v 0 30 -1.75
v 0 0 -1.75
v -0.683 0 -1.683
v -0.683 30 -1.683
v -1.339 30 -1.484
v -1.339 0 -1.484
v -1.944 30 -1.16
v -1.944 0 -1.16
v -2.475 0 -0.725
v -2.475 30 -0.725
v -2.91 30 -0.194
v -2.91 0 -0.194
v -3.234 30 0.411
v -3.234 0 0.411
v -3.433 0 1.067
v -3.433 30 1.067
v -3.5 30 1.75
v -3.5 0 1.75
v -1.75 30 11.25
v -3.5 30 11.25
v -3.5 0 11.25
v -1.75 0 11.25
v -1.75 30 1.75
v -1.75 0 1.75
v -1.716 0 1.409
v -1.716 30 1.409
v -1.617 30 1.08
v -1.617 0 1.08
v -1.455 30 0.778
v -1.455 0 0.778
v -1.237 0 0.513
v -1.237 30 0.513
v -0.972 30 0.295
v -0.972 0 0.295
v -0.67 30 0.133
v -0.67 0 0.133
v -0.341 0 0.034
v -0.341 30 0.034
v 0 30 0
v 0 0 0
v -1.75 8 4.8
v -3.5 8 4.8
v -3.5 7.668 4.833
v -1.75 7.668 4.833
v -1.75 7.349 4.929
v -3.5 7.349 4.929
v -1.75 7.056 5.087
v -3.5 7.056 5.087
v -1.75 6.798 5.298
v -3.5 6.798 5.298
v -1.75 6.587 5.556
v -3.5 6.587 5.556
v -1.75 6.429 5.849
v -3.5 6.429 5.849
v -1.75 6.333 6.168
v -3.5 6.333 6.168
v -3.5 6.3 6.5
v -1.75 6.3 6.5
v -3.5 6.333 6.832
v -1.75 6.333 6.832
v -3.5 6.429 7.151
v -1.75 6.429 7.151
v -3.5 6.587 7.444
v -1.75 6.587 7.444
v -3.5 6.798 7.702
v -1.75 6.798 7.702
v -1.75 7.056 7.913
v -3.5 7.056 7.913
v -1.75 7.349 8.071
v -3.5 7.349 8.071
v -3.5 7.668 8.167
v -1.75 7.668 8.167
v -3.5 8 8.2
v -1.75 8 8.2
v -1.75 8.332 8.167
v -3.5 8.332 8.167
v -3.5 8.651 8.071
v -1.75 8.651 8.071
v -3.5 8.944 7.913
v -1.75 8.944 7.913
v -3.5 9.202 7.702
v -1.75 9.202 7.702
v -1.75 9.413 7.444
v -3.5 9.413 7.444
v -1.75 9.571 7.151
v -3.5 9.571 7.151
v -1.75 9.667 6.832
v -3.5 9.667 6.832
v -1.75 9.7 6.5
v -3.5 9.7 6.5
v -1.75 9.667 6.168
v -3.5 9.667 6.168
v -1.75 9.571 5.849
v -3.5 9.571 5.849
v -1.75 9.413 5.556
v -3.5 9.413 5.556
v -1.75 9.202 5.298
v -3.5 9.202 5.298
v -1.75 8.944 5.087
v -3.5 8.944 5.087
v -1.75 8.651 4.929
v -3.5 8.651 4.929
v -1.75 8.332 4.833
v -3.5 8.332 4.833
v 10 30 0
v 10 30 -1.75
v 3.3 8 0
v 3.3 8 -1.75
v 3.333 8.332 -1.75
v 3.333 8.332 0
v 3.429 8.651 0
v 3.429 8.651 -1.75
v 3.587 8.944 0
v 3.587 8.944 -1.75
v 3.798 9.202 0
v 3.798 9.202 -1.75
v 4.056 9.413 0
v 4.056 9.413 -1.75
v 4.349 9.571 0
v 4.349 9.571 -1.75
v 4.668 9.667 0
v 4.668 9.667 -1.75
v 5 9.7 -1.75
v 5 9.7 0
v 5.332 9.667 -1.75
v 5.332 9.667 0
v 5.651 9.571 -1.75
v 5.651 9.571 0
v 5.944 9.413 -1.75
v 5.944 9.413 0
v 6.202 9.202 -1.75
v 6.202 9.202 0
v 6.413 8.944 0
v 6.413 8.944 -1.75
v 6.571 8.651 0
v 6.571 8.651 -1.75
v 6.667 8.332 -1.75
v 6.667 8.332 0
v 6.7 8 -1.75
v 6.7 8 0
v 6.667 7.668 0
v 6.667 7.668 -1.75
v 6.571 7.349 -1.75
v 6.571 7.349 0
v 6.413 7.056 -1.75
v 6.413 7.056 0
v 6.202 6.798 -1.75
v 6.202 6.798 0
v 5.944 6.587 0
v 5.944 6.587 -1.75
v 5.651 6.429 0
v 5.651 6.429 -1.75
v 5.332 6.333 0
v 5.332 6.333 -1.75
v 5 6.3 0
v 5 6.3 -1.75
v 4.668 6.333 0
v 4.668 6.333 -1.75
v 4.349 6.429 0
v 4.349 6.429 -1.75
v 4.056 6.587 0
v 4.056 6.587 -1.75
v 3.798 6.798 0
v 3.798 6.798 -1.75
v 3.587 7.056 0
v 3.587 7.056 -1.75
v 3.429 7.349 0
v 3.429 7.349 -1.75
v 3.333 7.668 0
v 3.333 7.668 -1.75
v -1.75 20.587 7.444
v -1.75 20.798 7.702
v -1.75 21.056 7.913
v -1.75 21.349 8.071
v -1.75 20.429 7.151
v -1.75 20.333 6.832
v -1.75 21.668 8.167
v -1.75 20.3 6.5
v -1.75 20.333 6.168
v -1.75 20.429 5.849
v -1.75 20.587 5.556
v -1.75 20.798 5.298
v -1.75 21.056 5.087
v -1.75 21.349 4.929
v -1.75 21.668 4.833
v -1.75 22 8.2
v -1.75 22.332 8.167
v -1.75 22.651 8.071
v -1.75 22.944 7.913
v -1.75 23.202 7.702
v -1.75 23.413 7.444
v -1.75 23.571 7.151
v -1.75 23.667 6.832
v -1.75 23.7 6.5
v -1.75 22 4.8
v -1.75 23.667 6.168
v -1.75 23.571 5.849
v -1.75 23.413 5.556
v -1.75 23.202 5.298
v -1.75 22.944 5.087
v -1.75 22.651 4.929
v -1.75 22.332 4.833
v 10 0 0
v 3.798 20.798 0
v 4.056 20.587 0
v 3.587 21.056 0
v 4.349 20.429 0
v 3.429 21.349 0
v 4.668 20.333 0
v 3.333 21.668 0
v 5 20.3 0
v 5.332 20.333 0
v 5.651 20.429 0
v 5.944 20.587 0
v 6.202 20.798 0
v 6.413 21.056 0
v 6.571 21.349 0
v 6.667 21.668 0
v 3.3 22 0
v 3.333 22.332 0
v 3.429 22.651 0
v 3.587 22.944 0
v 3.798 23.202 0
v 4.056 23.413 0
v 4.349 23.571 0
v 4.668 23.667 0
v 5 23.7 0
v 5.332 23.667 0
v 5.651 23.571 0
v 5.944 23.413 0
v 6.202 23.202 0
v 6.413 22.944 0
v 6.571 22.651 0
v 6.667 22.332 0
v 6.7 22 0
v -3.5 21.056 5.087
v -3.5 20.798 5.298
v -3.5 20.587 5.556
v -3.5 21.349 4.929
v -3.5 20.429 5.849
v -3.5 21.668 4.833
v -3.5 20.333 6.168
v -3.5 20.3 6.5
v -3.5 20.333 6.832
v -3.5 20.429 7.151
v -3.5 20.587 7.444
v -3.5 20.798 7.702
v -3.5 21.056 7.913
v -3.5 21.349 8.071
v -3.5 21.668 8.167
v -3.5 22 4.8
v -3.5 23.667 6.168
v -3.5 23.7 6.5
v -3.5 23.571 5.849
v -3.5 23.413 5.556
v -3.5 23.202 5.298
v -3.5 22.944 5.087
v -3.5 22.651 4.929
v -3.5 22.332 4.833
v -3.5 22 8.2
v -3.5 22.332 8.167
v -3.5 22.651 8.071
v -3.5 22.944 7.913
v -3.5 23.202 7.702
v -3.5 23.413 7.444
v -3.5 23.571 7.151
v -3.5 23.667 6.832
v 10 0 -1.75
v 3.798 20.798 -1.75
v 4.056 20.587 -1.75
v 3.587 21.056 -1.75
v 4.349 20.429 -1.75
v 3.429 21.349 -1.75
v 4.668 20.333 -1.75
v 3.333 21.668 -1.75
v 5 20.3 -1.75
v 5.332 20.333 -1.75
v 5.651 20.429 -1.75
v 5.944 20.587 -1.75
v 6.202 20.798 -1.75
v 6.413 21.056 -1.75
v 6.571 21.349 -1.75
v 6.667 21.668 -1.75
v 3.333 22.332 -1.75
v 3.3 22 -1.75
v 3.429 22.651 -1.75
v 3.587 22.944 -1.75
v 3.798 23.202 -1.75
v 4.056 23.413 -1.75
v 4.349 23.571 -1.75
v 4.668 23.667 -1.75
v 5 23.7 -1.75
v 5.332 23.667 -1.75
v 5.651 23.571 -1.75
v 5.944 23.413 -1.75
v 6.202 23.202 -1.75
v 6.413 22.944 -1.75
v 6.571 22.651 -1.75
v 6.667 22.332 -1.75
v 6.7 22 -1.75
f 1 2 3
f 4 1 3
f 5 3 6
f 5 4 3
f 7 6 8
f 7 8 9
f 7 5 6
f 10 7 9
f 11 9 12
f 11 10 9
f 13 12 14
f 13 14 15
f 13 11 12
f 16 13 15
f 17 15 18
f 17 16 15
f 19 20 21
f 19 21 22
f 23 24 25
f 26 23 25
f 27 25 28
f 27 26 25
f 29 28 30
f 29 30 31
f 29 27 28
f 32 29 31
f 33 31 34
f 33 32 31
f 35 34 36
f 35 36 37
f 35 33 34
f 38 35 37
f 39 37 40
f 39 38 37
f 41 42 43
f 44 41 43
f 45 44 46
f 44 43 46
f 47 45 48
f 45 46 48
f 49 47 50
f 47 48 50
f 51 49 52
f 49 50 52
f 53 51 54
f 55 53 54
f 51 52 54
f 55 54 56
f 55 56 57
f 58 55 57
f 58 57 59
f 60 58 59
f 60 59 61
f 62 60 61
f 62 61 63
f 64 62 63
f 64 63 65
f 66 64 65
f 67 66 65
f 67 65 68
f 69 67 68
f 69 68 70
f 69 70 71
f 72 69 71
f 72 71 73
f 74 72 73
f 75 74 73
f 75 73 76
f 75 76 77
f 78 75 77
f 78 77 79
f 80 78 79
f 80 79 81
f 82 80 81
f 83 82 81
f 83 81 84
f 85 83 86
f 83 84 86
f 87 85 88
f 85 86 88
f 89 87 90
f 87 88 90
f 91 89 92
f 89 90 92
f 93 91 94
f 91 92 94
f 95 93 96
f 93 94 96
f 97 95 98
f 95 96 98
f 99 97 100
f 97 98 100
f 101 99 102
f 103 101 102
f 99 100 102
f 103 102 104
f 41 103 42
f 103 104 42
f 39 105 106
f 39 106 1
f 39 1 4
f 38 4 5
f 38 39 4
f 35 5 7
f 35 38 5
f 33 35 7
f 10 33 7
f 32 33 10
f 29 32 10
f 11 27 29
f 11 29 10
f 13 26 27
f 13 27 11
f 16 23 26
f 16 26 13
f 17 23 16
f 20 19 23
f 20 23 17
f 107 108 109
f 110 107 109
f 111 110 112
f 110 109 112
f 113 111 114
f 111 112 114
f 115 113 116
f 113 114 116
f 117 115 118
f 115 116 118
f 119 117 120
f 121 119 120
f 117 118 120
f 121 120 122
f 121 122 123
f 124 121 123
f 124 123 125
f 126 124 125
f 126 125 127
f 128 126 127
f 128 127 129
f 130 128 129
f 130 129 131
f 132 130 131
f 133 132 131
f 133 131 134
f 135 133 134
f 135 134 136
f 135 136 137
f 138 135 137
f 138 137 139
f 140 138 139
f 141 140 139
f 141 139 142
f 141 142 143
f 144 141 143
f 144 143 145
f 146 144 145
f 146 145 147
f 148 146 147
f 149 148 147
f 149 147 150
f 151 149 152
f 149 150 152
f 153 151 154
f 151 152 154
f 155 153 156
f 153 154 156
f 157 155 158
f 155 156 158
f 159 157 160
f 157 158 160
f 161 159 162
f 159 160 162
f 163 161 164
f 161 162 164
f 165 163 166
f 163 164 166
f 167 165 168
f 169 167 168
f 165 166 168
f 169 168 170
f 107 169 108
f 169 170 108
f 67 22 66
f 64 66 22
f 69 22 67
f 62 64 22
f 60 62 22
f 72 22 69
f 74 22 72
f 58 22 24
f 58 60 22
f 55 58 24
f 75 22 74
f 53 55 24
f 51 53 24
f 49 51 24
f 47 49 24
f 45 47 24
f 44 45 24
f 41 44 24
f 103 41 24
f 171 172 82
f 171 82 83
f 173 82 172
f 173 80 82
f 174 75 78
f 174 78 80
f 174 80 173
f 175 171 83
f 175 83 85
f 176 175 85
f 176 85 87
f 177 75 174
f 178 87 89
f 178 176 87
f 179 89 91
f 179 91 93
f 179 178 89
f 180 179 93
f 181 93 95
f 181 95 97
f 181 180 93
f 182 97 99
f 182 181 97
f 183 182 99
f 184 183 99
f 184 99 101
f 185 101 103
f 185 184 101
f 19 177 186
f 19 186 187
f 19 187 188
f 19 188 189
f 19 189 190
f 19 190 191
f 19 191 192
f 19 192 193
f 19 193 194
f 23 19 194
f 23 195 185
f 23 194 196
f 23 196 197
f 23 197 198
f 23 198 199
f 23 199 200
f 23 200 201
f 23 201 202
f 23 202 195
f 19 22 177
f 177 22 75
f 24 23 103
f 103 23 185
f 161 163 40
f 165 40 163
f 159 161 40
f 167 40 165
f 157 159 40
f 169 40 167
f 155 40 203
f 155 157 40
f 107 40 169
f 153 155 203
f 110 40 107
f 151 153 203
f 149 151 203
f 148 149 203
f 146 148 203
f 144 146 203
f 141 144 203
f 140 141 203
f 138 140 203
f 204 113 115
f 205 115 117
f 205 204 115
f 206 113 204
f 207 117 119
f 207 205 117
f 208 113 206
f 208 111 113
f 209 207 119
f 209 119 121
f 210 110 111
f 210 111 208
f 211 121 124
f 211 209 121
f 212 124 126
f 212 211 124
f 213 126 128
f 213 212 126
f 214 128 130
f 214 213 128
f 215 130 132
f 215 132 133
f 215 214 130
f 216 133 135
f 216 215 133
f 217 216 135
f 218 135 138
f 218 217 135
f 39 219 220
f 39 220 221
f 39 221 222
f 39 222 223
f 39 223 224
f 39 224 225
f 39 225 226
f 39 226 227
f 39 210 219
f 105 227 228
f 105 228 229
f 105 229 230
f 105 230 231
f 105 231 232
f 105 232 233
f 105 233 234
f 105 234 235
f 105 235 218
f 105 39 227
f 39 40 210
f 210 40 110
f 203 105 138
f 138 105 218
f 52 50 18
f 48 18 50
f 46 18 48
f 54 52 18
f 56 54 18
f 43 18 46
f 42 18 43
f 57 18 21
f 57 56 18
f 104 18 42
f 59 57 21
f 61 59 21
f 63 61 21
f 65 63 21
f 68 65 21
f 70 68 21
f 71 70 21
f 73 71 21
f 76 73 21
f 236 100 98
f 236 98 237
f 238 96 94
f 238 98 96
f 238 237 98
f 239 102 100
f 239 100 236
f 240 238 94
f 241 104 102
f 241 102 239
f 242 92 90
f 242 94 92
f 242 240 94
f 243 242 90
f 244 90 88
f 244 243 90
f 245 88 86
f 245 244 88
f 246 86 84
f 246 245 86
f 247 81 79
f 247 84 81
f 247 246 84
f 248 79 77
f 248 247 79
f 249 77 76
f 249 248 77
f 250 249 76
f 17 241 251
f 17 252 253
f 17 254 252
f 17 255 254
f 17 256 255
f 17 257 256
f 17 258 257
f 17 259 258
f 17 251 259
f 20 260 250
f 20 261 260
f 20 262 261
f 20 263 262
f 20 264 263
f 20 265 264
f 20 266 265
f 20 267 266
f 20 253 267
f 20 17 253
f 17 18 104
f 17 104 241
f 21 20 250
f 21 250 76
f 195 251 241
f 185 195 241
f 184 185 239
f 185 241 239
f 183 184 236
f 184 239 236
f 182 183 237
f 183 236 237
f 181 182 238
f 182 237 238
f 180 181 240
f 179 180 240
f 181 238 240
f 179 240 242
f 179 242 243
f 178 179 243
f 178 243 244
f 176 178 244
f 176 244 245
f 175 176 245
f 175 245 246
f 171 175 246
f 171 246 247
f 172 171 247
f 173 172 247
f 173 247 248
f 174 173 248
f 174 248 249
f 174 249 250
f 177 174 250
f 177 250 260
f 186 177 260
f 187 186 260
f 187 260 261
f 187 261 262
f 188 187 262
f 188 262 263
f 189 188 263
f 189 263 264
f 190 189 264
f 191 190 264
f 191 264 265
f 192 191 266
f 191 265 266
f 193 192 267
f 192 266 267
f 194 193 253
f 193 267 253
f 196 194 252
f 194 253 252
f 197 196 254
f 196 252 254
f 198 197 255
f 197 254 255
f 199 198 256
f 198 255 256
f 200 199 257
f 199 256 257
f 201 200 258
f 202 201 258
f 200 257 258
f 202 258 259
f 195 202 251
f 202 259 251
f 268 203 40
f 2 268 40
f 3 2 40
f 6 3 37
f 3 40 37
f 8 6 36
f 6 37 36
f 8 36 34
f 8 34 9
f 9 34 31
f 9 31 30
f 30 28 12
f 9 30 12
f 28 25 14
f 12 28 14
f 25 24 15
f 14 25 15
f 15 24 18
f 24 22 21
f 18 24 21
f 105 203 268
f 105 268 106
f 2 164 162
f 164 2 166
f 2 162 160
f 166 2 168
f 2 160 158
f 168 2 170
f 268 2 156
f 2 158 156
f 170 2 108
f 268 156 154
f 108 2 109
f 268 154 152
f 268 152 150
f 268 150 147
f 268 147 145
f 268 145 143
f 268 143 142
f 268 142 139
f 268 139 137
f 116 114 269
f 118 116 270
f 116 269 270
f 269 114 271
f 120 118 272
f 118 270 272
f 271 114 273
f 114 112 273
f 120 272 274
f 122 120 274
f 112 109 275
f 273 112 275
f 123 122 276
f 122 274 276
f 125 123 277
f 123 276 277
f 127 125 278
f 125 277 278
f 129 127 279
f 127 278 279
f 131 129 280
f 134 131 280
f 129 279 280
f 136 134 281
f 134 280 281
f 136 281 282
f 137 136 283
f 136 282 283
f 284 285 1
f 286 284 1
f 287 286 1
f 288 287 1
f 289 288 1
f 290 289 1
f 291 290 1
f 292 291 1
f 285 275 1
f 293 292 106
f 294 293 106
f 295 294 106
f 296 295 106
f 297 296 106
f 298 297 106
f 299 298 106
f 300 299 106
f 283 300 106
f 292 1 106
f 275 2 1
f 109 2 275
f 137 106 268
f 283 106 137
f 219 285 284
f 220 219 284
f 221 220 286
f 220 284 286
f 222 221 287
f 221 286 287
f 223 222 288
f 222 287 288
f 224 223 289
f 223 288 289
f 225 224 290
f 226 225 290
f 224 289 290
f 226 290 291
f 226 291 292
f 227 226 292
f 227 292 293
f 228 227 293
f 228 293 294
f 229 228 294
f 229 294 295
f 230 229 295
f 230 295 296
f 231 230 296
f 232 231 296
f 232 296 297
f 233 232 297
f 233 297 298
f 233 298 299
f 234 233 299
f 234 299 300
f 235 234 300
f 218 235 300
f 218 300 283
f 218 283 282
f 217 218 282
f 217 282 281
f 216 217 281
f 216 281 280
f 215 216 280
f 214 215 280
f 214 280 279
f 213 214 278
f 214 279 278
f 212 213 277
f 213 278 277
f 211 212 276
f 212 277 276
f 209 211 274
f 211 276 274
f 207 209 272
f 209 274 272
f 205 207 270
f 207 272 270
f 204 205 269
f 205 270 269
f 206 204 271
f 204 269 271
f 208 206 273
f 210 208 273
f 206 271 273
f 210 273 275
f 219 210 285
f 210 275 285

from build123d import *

# Parameters (mm, degrees)
SKETCH1_W                          = 10
SKETCH1_H                          = 30
BASE_FLANGE1_DEPTH                 = 1.75
EDGE_FLANGE1_DEPTH                 = 30
M3_CLEARANCE_HOLE1_D               = 3.4
M3_CLEARANCE_HOLE1_DEPTH           = 5
M3_CLEARANCE_HOLE1_TIP             = 1.021463052
M3_CLEARANCE_HOLE1_ON_FACE_2_D     = 3.4
M3_CLEARANCE_HOLE1_ON_FACE_2_DEPTH = 5
M3_CLEARANCE_HOLE1_ON_FACE_2_TIP   = 1.021463052


# Sheet-metal steps are written as plain solids
with BuildPart() as part:
    # Sketch1 → Base-Flange1 (new body)
    with BuildSketch(Plane.XY):
        with Locations((5, 15)):
            Rectangle(SKETCH1_W, SKETCH1_H)
    extrude(amount=-BASE_FLANGE1_DEPTH)

    # Edge-Flange1 section (across the edge) → Edge-Flange1 (add)
    with BuildSketch(Plane(origin=(-1.75, 30, 0), x_dir=(1, 0, 0), z_dir=(0, -1, 0))):
        with BuildLine():
            Line((-1.75, 1.75), (-1.75, 11.25))
            Line((-1.75, 11.25), (0, 11.25))
            Line((0, 11.25), (0, 1.75))
            ThreePointArc((0, 1.75), (0.512563133, 0.512563133), (1.75, 0))
            Line((1.75, 0), (1.75, -1.75))
            ThreePointArc((1.75, -1.75), (-0.724873734, -0.724873734), (-1.75, 1.75))
        make_face()
    extrude(amount=EDGE_FLANGE1_DEPTH)

    # M3 Clearance Hole1
    with Locations(Plane(origin=(5, 22, 0), x_dir=(1, 0, 0), z_dir=(0, 0, 1))):
        with Locations((0, 0), (0, -14)):
            Hole(M3_CLEARANCE_HOLE1_D / 2, depth=M3_CLEARANCE_HOLE1_DEPTH)
            with Locations((0, 0, -(M3_CLEARANCE_HOLE1_DEPTH + M3_CLEARANCE_HOLE1_TIP / 2))):  # 118° drill point
                Cone(0, M3_CLEARANCE_HOLE1_D / 2, M3_CLEARANCE_HOLE1_TIP, mode=Mode.SUBTRACT)

    # M3 Clearance Hole1 on face 2
    with Locations(Plane(origin=(-1.75, 22, 6.5), x_dir=(0, 0, 1), z_dir=(1, 0, 0))):
        with Locations((0, 0), (0, 14)):
            Hole(M3_CLEARANCE_HOLE1_ON_FACE_2_D / 2, depth=M3_CLEARANCE_HOLE1_ON_FACE_2_DEPTH)
            with Locations((0, 0, -(M3_CLEARANCE_HOLE1_ON_FACE_2_DEPTH + M3_CLEARANCE_HOLE1_ON_FACE_2_TIP / 2))):  # 118° drill point
                Cone(0, M3_CLEARANCE_HOLE1_ON_FACE_2_D / 2, M3_CLEARANCE_HOLE1_ON_FACE_2_TIP, mode=Mode.SUBTRACT)


solid = part.part
